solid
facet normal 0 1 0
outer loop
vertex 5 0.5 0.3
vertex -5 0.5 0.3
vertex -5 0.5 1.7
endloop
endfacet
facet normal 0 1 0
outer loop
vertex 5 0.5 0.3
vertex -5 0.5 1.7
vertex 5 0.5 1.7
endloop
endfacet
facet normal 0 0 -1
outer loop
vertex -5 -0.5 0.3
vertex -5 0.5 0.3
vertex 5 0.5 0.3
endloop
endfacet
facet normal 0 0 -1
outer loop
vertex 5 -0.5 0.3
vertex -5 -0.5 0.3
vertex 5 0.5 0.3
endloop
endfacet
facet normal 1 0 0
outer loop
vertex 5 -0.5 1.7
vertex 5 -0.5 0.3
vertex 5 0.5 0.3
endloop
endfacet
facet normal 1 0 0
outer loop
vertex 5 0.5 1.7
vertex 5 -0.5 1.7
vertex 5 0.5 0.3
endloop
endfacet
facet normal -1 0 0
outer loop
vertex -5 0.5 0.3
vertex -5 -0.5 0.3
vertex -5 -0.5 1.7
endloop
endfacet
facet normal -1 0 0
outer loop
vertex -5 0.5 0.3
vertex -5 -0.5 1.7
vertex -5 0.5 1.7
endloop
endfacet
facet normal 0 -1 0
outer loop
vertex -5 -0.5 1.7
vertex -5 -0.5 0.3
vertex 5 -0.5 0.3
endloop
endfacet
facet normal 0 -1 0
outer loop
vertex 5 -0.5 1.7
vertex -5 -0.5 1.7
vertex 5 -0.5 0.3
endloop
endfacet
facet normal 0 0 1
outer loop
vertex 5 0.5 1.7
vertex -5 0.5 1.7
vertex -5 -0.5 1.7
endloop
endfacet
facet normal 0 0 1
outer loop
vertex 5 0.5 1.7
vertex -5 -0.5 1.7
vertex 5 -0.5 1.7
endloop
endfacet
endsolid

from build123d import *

# Parameters (mm, degrees)
SKETCH1_W           = 10
SKETCH1_H           = 1
BOSS_EXTRUDE1_DEPTH = 2
MOVE_FACE1_BY       = 0.3
MOVE_FACE2_BY       = 0.3


with BuildPart() as part:
    # Sketch1 → Boss-Extrude1 (new body)
    with BuildSketch(Plane.XY):
        Rectangle(SKETCH1_W, SKETCH1_H)
    extrude(amount=BOSS_EXTRUDE1_DEPTH)

    # Move Face1: a face moved inward by 0.3
    extrude(part.faces().sort_by_distance((0, 0, 0))[0], amount=MOVE_FACE1_BY, dir=(0, 0, 1), mode=Mode.SUBTRACT)

    # Move Face2: a face moved inward by 0.3
    extrude(part.faces().sort_by_distance((0, 0, 2))[0], amount=MOVE_FACE2_BY, dir=(0, 0, -1), mode=Mode.SUBTRACT)


solid = part.part
